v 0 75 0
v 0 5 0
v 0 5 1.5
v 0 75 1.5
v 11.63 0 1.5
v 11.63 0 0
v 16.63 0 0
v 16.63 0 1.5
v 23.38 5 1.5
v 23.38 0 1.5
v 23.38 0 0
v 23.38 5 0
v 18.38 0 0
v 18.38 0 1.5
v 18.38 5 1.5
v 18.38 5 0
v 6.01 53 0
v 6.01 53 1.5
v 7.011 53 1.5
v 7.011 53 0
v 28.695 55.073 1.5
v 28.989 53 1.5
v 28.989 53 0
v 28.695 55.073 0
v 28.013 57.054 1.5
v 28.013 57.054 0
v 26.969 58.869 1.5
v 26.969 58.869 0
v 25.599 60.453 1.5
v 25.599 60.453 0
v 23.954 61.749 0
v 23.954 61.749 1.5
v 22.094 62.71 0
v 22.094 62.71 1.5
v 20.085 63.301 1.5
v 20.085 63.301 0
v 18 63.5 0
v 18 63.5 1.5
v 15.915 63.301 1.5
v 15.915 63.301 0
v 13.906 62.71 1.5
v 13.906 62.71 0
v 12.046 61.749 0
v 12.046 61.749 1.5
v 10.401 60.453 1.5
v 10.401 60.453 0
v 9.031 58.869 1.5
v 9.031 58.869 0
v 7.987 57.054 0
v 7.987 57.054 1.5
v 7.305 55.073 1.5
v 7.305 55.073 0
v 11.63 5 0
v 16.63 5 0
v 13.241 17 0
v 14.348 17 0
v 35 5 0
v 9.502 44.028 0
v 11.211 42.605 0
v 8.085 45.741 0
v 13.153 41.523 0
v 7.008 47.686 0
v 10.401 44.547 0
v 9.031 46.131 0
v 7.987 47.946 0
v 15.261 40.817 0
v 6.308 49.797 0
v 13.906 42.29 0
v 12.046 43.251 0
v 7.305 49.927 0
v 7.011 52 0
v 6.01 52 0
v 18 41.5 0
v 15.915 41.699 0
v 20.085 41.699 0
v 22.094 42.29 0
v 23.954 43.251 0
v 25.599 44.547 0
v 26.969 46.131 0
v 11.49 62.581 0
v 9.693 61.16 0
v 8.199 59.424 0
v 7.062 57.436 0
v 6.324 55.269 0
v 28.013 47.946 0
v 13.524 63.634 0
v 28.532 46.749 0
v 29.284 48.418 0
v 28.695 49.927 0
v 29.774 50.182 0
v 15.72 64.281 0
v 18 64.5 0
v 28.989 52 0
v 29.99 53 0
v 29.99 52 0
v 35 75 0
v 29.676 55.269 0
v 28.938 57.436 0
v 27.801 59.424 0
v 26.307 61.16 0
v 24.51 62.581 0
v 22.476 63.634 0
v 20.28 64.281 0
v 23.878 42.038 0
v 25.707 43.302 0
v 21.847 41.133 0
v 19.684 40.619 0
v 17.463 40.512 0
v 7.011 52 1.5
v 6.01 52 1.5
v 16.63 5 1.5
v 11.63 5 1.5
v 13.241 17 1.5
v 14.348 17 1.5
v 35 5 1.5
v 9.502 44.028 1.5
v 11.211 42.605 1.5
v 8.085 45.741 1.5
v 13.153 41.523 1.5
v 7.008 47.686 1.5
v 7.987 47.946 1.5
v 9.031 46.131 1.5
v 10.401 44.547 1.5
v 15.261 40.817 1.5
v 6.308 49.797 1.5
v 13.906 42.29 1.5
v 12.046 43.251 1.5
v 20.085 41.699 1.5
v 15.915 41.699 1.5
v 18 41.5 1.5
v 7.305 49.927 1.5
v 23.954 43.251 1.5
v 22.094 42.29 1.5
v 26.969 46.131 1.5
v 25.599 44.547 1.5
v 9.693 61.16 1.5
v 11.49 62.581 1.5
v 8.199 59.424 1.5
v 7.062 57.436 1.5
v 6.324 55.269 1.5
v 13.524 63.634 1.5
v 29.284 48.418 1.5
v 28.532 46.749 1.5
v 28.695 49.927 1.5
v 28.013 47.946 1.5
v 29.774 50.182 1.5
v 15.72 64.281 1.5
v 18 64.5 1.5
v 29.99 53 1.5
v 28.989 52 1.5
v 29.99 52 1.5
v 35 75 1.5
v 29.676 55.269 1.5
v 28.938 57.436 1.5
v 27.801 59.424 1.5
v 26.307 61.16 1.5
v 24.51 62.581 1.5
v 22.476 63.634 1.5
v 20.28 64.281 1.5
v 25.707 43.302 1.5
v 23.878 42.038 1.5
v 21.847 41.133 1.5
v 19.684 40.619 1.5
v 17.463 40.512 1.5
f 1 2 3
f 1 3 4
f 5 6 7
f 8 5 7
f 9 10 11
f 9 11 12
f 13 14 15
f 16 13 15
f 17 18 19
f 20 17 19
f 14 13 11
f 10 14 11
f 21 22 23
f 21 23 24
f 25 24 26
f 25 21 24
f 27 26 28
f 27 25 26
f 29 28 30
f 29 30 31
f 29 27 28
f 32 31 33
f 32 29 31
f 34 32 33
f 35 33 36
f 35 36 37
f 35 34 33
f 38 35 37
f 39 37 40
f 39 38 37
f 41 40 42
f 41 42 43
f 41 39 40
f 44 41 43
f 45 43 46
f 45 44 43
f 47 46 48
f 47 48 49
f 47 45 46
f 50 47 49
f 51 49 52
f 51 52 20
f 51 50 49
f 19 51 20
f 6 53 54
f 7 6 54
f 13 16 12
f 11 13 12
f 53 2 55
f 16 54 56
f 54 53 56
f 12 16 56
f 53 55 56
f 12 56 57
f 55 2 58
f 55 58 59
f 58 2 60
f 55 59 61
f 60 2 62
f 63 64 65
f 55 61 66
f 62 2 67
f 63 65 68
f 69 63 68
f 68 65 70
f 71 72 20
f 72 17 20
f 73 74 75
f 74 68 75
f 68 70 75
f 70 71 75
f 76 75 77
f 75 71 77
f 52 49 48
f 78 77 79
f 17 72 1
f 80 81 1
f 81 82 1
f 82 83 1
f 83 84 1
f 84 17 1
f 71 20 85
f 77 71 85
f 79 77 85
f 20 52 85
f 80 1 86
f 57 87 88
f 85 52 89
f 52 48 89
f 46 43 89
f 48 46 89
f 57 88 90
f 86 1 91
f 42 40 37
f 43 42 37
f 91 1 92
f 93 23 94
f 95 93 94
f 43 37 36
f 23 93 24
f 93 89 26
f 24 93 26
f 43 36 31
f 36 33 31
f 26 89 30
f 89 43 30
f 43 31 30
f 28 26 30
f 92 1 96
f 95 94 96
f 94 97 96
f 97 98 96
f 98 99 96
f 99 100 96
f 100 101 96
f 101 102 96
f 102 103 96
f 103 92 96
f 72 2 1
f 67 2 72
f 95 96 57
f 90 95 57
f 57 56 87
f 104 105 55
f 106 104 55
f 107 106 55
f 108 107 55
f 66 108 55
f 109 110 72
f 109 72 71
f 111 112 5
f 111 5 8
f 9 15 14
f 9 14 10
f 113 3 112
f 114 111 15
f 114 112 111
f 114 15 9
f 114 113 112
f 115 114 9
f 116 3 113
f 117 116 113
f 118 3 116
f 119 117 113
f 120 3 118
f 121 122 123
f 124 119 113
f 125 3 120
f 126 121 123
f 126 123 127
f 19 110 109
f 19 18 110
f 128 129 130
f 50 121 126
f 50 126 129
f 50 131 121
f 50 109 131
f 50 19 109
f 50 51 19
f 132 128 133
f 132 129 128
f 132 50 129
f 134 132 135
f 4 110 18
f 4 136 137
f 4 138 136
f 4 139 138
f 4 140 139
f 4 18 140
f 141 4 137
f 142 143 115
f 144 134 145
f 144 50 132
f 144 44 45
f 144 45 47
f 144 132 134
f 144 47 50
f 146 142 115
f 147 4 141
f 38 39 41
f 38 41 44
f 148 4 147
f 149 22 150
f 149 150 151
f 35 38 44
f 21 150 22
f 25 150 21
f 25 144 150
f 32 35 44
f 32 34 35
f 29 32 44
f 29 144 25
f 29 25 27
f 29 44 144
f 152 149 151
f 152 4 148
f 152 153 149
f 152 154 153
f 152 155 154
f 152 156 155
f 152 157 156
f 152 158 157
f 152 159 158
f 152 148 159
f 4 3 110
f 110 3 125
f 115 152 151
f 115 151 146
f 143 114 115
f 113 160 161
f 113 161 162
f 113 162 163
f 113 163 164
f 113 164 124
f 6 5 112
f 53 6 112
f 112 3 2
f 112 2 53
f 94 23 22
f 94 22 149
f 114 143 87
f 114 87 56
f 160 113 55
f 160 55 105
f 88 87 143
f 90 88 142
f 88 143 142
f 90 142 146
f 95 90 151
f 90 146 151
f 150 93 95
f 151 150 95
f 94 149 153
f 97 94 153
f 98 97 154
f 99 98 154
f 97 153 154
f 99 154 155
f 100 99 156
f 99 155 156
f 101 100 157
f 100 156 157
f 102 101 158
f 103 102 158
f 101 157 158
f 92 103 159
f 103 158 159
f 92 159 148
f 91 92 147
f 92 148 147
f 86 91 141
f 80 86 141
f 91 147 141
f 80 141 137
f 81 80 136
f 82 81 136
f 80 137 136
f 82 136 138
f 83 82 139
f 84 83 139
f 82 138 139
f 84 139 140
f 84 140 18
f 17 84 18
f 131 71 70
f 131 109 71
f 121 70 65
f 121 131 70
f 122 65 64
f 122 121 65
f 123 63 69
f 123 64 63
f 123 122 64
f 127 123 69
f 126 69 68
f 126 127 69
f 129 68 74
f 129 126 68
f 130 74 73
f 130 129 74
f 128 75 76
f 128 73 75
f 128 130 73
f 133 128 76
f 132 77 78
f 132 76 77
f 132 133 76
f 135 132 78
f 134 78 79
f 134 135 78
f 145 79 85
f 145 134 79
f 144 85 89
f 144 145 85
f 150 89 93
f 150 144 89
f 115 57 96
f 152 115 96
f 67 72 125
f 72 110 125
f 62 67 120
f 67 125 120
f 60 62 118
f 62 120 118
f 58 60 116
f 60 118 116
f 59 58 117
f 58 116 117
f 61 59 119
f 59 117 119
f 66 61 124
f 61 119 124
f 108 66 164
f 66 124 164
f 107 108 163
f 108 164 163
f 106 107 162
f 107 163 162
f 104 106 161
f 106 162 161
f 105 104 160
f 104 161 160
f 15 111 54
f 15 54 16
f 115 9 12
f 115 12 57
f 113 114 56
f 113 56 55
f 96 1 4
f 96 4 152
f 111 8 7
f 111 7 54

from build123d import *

# Parameters (mm, degrees)
SKIZZE1_W                        = 35
SKIZZE1_H                        = 75
AUFSATZ_LINEAR_AUSTRAGEN1_DEPTH  = 1.5
SKIZZE2_W                        = 11.63
SKIZZE2_H                        = 5
SKIZZE2_W_2                      = 11.62
SKIZZE2_W_3                      = 1.75
SCHNITT_LINEAR_AUSTRAGEN1_DEPTH  = 1.5
SKIZZE13_R                       = 12
SKIZZE13_R_2                     = 11
SCHNITT_LINEAR_AUSTRAGEN10_DEPTH = 20
SKIZZE14_W                       = 27.206049555
SKIZZE14_H                       = 1
AUFSATZ_LINEAR_AUSTRAGEN2_DEPTH  = 1.5
SCHNITT_LINEAR_AUSTRAGEN11_DEPTH = 20


with BuildPart() as part:
    # Skizze1 → Aufsatz-Linear austragen1 (new body)
    with BuildSketch(Plane.XY):
        with Locations((17.5, 37.5)):
            Rectangle(SKIZZE1_W, SKIZZE1_H)
    extrude(amount=AUFSATZ_LINEAR_AUSTRAGEN1_DEPTH)

    # Skizze2 → Schnitt-Linear austragen1 (cut)
    with BuildSketch(Plane.XY.offset(1.5)):
        with Locations((5.815, 2.5)):
            Rectangle(SKIZZE2_W, SKIZZE2_H)
        with Locations((29.19, 2.5)):
            Rectangle(SKIZZE2_W_2, SKIZZE2_H)
        with Locations((17.505, 2.5)):
            Rectangle(SKIZZE2_W_3, SKIZZE2_H)
    extrude(amount=-SCHNITT_LINEAR_AUSTRAGEN1_DEPTH, mode=Mode.SUBTRACT)

    # Skizze13 → Schnitt-Linear austragen10 (cut)
    with BuildSketch(Plane.XY.offset(1.5)):
        with Locations((18, 52.5)):
            Circle(SKIZZE13_R)
        with Locations((18, 52.5)):
            Circle(SKIZZE13_R_2, mode=Mode.SUBTRACT)
    extrude(amount=-SCHNITT_LINEAR_AUSTRAGEN10_DEPTH, mode=Mode.SUBTRACT)


with BuildPart() as schnitt_linear_austragen10_piece_1:
    # of the separate pieces the step leaves, piece 1, a body of its own (schnitt_linear_austragen10_pieces)
    add(part.part.solids().sort_by_distance((11.63, 0, 0))[0])



with BuildPart() as schnitt_linear_austragen10_piece_2:
    # of the separate pieces the step leaves, piece 2, a body of its own (schnitt_linear_austragen10_pieces)
    add(part.part.solids().sort_by_distance((29, 52.5, 0))[0])


with BuildPart() as schnitt_linear_austragen10_piece_1_1:
    add(schnitt_linear_austragen10_piece_1.part)

    add(schnitt_linear_austragen10_piece_2.part)  # Aufsatz-Linear austragen2 merges Schnitt-Linear austragen10 piece 2
    # Skizze14 → Aufsatz-Linear austragen2 (add)
    with BuildSketch(Plane.XY.offset(1.5)):
        with Locations((18.390255325, 52.5)):
            Rectangle(SKIZZE14_W, SKIZZE14_H)
    extrude(amount=-AUFSATZ_LINEAR_AUSTRAGEN2_DEPTH)

    # Skizze15 → Schnitt-Linear austragen11 (cut)
    with BuildSketch(Plane.XY.offset(1.5)):
        Polygon((14.347795458, 17), (13.241164508, 17), (27.231585845, 46.518543423), (29.406174437, 48.771838964), (29.283539592, 48.415672114), (28.532345142, 46.749373442), align=None)
    extrude(amount=-SCHNITT_LINEAR_AUSTRAGEN11_DEPTH, mode=Mode.SUBTRACT)


solid = schnitt_linear_austragen10_piece_1_1.part
